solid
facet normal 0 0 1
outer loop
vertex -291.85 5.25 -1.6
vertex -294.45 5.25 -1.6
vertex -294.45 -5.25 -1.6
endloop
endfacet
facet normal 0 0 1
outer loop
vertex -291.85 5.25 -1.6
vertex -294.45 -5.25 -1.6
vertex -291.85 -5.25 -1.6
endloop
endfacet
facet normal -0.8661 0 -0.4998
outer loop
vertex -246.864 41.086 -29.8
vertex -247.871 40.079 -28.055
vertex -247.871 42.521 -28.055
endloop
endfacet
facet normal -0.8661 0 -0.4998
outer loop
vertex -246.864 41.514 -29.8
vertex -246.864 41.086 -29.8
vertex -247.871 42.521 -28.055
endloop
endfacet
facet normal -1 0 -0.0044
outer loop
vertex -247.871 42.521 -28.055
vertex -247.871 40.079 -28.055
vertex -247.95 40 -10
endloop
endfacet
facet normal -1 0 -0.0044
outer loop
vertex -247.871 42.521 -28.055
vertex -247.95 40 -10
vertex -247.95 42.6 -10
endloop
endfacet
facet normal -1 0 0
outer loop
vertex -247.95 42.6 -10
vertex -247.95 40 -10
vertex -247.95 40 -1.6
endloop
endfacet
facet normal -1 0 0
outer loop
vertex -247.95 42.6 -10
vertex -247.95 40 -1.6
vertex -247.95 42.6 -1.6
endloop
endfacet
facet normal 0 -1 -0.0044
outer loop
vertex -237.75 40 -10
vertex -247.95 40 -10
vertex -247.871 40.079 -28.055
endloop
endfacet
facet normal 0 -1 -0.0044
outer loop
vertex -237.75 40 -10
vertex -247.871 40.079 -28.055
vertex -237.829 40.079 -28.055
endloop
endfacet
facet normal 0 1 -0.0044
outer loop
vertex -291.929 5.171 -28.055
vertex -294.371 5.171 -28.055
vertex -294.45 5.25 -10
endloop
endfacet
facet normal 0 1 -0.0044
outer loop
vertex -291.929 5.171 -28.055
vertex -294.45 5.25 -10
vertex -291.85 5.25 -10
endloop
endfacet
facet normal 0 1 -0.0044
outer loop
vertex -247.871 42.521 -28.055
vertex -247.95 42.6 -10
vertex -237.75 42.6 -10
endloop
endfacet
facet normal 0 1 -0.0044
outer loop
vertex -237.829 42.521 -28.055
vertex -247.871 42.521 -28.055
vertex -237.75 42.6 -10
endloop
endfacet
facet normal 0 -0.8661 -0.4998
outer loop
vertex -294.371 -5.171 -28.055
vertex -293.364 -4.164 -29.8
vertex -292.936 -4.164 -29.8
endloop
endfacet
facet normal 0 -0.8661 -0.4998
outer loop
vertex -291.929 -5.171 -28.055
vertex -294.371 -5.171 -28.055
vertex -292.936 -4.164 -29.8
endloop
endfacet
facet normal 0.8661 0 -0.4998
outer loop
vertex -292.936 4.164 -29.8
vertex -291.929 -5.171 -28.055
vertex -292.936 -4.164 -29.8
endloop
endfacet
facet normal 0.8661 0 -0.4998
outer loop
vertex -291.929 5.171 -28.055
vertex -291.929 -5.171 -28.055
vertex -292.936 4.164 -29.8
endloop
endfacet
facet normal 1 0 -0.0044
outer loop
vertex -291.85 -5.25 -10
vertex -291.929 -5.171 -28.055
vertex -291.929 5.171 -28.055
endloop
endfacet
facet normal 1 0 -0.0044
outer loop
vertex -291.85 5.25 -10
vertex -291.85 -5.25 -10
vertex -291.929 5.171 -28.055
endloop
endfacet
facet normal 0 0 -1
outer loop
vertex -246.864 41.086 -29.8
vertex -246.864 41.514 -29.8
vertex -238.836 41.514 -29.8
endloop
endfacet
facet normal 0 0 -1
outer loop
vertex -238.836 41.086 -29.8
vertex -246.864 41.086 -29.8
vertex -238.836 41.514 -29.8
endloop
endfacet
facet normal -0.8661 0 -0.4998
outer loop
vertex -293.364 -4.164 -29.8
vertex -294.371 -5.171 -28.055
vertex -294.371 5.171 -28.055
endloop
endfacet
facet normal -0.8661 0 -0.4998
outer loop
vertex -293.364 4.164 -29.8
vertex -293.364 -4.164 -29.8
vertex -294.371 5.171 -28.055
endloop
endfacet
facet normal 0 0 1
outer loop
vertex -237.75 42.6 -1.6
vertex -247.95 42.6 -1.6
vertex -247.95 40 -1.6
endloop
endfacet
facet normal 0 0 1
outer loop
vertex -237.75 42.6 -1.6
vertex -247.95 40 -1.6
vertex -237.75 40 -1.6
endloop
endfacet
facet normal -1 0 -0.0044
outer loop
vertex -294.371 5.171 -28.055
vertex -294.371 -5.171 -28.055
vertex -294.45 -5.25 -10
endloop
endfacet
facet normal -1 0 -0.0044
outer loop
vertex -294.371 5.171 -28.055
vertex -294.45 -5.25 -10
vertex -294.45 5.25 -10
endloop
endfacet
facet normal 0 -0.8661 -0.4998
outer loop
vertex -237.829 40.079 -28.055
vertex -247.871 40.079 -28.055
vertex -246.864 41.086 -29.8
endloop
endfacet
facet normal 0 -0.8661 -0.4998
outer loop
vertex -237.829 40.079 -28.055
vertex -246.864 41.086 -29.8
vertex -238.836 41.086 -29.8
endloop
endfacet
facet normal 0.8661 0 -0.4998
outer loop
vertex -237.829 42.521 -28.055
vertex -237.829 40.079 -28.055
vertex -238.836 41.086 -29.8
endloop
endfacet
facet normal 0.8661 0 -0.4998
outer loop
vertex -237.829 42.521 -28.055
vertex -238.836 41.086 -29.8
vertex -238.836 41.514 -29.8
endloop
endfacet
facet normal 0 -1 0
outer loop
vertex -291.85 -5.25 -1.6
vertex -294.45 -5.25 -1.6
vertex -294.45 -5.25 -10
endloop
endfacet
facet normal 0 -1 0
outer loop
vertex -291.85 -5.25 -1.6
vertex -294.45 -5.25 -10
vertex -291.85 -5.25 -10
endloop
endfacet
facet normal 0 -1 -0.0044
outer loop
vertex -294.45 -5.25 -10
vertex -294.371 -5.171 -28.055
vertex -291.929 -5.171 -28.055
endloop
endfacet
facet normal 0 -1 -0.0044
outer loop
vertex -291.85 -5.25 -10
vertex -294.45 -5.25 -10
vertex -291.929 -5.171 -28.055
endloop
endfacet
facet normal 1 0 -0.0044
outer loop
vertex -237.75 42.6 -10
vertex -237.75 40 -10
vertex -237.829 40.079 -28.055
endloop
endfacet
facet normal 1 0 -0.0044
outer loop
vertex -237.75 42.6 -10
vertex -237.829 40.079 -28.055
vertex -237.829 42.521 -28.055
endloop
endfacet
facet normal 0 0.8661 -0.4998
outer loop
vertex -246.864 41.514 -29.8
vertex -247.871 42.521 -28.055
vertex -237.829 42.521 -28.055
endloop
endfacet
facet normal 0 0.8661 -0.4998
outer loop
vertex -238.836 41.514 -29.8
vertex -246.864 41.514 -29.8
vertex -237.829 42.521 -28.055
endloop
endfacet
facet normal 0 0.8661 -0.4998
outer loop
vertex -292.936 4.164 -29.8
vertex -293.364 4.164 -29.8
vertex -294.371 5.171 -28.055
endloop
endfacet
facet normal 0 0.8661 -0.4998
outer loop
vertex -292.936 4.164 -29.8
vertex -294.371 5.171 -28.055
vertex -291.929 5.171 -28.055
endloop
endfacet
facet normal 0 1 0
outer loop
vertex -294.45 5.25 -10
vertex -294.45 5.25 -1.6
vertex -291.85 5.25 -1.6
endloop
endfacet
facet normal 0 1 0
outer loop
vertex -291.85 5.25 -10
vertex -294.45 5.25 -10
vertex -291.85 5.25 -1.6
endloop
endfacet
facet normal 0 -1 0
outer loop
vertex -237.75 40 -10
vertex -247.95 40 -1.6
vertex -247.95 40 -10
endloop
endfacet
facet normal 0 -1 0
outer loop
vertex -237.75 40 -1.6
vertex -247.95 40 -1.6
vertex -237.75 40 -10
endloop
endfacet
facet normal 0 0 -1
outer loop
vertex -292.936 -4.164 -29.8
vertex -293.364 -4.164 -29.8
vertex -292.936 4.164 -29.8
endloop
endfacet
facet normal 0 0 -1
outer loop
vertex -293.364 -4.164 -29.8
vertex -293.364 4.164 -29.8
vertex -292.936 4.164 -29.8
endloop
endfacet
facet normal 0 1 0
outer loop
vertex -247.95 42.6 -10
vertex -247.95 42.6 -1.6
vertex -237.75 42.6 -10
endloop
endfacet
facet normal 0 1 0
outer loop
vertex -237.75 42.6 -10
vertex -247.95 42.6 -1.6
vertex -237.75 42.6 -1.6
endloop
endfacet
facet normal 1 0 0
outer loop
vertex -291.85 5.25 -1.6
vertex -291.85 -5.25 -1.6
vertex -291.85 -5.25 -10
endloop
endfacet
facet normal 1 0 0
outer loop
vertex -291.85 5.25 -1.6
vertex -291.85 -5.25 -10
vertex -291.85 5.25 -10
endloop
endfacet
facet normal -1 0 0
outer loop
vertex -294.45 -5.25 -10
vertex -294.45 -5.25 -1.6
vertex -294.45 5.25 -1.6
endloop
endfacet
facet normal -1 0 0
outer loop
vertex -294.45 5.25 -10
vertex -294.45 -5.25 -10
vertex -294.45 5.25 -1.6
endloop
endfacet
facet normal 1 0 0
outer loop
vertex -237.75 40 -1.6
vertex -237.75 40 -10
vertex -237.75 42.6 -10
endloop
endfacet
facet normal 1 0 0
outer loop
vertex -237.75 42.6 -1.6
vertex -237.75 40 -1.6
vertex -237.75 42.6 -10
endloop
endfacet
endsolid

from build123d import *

# Parameters (mm, degrees)
SHIMS_TOP_START          = -1.6
SHIMS_SKETCH_W           = 2.6
SHIMS_SKETCH_H           = 10.5
SHIMS_TOP_DEPTH          = 8.4
SHIMS_SKETCH_W_2         = 10.2
SHIMS_SKETCH_H_2         = 2.6
SHIMS_TOP_2_DEPTH        = 8.4
SHIMS_BOTTOM_OUTLINE_W   = 10.027211308
SHIMS_BOTTOM_OUTLINE_H   = 2.427211308
SHIMS_BOTTOM_DEPTH       = 19.8
SHIMS_BOTTOM_DRAFT       = -0.25
SHIMS_BOTTOM_2_OUTLINE_W = 2.427211308
SHIMS_BOTTOM_2_OUTLINE_H = 10.327211308
SHIMS_BOTTOM_2_DEPTH     = 19.8
SHIMS_BOTTOM_2_DRAFT     = -0.25
CHAMFER1_SIZE            = 1
CHAMFER1_SIZE2           = 1.745257156
CHAMFER2_SIZE            = 1
CHAMFER2_SIZE2           = 1.745257156


# Read off the part's stored shape, not the designer's step: shims_bottom
with BuildPart() as part:
    # shims_sketch → shims_top (new body)
    with BuildSketch(Plane.XY.offset(SHIMS_TOP_START)):
        with Locations((-293.15, 0)):
            Rectangle(SHIMS_SKETCH_W, SHIMS_SKETCH_H)
    extrude(amount=-SHIMS_TOP_DEPTH)


with BuildPart() as body_2:
    # shims_sketch → shims_top 2 (new body)
    with BuildSketch(Plane.XY.offset(SHIMS_TOP_START)):
        with Locations((-242.85, 41.3)):
            Rectangle(SHIMS_SKETCH_W_2, SHIMS_SKETCH_H_2)
    extrude(amount=-SHIMS_TOP_2_DEPTH)


with BuildPart() as shims_bottom_tool:
    # shims_bottom outline → shims_bottom (with draft: the straight prism first)
    with BuildSketch(Plane.XY.offset(-29.8)):
        with Locations((-242.85, 41.3)):
            Rectangle(SHIMS_BOTTOM_OUTLINE_W, SHIMS_BOTTOM_OUTLINE_H)
    extrude(amount=SHIMS_BOTTOM_DEPTH)
    # shims_bottom: the draft: its side faces are tilted about the plane it starts from
    shims_bottom_sides = [shims_bottom_tool.faces().sort_by_distance(p)[0] for p in [
        (-242.85, 40.086394346, -19.9),
        (-237.836394346, 41.3, -19.9),
        (-242.85, 42.513605654, -19.9),
        (-247.863605654, 41.3, -19.9),
    ]]
    draft(shims_bottom_sides, Plane.XY.offset(-29.8), SHIMS_BOTTOM_DRAFT)


with BuildPart() as part_1:
    add(part.part)

    # shims_bottom: add shims_bottom_tool
    add(shims_bottom_tool.part)

    add(body_2.part)  # shims_bottom merges body 2


with BuildPart() as shims_bottom_2_tool:
    # shims_bottom 2 outline → shims_bottom 2 (with draft: the straight prism first)
    with BuildSketch(Plane.XY.offset(-29.8)):
        with Locations((-293.15, 0)):
            Rectangle(SHIMS_BOTTOM_2_OUTLINE_W, SHIMS_BOTTOM_2_OUTLINE_H)
    extrude(amount=SHIMS_BOTTOM_2_DEPTH)
    # shims_bottom 2: the draft: its side faces are tilted about the plane it starts from
    shims_bottom_2_sides = [shims_bottom_2_tool.faces().sort_by_distance(p)[0] for p in [
        (-293.15, -5.163605654, -19.9),
        (-291.936394346, 0, -19.9),
        (-293.15, 5.163605654, -19.9),
        (-294.363605654, 0, -19.9),
    ]]
    draft(shims_bottom_2_sides, Plane.XY.offset(-29.8), SHIMS_BOTTOM_2_DRAFT)


with BuildPart() as part_2:
    add(part_1.part)

    # shims_bottom 2: add shims_bottom_2_tool
    add(shims_bottom_2_tool.part)

    # Chamfer1
    chamfer1_edges = [part_2.edges().sort_by_distance(p)[0] for p in [
        (-293.15, -5.163605654, -29.8),
        (-291.936394346, 0, -29.8),
        (-293.15, 5.163605654, -29.8),
        (-294.363605654, 0, -29.8),
    ]]
    chamfer1_side = [part_2.faces().sort_by_distance(p)[0] for p in [
        (-293.15, 0, -29.8),
    ]]
    chamfer(chamfer1_edges, length=CHAMFER1_SIZE, length2=CHAMFER1_SIZE2, reference=chamfer1_side[0])

    # Chamfer2
    chamfer2_edges = [part_2.edges().sort_by_distance(p)[0] for p in [
        (-237.836394346, 41.3, -29.8),
        (-242.85, 42.513605654, -29.8),
        (-247.863605654, 41.3, -29.8),
        (-242.85, 40.086394346, -29.8),
    ]]
    chamfer2_side = [part_2.faces().sort_by_distance(p)[0] for p in [
        (-242.85, 41.3, -29.8),
    ]]
    chamfer(chamfer2_edges, length=CHAMFER2_SIZE, length2=CHAMFER2_SIZE2, reference=chamfer2_side[0])


solid = part_2.part
